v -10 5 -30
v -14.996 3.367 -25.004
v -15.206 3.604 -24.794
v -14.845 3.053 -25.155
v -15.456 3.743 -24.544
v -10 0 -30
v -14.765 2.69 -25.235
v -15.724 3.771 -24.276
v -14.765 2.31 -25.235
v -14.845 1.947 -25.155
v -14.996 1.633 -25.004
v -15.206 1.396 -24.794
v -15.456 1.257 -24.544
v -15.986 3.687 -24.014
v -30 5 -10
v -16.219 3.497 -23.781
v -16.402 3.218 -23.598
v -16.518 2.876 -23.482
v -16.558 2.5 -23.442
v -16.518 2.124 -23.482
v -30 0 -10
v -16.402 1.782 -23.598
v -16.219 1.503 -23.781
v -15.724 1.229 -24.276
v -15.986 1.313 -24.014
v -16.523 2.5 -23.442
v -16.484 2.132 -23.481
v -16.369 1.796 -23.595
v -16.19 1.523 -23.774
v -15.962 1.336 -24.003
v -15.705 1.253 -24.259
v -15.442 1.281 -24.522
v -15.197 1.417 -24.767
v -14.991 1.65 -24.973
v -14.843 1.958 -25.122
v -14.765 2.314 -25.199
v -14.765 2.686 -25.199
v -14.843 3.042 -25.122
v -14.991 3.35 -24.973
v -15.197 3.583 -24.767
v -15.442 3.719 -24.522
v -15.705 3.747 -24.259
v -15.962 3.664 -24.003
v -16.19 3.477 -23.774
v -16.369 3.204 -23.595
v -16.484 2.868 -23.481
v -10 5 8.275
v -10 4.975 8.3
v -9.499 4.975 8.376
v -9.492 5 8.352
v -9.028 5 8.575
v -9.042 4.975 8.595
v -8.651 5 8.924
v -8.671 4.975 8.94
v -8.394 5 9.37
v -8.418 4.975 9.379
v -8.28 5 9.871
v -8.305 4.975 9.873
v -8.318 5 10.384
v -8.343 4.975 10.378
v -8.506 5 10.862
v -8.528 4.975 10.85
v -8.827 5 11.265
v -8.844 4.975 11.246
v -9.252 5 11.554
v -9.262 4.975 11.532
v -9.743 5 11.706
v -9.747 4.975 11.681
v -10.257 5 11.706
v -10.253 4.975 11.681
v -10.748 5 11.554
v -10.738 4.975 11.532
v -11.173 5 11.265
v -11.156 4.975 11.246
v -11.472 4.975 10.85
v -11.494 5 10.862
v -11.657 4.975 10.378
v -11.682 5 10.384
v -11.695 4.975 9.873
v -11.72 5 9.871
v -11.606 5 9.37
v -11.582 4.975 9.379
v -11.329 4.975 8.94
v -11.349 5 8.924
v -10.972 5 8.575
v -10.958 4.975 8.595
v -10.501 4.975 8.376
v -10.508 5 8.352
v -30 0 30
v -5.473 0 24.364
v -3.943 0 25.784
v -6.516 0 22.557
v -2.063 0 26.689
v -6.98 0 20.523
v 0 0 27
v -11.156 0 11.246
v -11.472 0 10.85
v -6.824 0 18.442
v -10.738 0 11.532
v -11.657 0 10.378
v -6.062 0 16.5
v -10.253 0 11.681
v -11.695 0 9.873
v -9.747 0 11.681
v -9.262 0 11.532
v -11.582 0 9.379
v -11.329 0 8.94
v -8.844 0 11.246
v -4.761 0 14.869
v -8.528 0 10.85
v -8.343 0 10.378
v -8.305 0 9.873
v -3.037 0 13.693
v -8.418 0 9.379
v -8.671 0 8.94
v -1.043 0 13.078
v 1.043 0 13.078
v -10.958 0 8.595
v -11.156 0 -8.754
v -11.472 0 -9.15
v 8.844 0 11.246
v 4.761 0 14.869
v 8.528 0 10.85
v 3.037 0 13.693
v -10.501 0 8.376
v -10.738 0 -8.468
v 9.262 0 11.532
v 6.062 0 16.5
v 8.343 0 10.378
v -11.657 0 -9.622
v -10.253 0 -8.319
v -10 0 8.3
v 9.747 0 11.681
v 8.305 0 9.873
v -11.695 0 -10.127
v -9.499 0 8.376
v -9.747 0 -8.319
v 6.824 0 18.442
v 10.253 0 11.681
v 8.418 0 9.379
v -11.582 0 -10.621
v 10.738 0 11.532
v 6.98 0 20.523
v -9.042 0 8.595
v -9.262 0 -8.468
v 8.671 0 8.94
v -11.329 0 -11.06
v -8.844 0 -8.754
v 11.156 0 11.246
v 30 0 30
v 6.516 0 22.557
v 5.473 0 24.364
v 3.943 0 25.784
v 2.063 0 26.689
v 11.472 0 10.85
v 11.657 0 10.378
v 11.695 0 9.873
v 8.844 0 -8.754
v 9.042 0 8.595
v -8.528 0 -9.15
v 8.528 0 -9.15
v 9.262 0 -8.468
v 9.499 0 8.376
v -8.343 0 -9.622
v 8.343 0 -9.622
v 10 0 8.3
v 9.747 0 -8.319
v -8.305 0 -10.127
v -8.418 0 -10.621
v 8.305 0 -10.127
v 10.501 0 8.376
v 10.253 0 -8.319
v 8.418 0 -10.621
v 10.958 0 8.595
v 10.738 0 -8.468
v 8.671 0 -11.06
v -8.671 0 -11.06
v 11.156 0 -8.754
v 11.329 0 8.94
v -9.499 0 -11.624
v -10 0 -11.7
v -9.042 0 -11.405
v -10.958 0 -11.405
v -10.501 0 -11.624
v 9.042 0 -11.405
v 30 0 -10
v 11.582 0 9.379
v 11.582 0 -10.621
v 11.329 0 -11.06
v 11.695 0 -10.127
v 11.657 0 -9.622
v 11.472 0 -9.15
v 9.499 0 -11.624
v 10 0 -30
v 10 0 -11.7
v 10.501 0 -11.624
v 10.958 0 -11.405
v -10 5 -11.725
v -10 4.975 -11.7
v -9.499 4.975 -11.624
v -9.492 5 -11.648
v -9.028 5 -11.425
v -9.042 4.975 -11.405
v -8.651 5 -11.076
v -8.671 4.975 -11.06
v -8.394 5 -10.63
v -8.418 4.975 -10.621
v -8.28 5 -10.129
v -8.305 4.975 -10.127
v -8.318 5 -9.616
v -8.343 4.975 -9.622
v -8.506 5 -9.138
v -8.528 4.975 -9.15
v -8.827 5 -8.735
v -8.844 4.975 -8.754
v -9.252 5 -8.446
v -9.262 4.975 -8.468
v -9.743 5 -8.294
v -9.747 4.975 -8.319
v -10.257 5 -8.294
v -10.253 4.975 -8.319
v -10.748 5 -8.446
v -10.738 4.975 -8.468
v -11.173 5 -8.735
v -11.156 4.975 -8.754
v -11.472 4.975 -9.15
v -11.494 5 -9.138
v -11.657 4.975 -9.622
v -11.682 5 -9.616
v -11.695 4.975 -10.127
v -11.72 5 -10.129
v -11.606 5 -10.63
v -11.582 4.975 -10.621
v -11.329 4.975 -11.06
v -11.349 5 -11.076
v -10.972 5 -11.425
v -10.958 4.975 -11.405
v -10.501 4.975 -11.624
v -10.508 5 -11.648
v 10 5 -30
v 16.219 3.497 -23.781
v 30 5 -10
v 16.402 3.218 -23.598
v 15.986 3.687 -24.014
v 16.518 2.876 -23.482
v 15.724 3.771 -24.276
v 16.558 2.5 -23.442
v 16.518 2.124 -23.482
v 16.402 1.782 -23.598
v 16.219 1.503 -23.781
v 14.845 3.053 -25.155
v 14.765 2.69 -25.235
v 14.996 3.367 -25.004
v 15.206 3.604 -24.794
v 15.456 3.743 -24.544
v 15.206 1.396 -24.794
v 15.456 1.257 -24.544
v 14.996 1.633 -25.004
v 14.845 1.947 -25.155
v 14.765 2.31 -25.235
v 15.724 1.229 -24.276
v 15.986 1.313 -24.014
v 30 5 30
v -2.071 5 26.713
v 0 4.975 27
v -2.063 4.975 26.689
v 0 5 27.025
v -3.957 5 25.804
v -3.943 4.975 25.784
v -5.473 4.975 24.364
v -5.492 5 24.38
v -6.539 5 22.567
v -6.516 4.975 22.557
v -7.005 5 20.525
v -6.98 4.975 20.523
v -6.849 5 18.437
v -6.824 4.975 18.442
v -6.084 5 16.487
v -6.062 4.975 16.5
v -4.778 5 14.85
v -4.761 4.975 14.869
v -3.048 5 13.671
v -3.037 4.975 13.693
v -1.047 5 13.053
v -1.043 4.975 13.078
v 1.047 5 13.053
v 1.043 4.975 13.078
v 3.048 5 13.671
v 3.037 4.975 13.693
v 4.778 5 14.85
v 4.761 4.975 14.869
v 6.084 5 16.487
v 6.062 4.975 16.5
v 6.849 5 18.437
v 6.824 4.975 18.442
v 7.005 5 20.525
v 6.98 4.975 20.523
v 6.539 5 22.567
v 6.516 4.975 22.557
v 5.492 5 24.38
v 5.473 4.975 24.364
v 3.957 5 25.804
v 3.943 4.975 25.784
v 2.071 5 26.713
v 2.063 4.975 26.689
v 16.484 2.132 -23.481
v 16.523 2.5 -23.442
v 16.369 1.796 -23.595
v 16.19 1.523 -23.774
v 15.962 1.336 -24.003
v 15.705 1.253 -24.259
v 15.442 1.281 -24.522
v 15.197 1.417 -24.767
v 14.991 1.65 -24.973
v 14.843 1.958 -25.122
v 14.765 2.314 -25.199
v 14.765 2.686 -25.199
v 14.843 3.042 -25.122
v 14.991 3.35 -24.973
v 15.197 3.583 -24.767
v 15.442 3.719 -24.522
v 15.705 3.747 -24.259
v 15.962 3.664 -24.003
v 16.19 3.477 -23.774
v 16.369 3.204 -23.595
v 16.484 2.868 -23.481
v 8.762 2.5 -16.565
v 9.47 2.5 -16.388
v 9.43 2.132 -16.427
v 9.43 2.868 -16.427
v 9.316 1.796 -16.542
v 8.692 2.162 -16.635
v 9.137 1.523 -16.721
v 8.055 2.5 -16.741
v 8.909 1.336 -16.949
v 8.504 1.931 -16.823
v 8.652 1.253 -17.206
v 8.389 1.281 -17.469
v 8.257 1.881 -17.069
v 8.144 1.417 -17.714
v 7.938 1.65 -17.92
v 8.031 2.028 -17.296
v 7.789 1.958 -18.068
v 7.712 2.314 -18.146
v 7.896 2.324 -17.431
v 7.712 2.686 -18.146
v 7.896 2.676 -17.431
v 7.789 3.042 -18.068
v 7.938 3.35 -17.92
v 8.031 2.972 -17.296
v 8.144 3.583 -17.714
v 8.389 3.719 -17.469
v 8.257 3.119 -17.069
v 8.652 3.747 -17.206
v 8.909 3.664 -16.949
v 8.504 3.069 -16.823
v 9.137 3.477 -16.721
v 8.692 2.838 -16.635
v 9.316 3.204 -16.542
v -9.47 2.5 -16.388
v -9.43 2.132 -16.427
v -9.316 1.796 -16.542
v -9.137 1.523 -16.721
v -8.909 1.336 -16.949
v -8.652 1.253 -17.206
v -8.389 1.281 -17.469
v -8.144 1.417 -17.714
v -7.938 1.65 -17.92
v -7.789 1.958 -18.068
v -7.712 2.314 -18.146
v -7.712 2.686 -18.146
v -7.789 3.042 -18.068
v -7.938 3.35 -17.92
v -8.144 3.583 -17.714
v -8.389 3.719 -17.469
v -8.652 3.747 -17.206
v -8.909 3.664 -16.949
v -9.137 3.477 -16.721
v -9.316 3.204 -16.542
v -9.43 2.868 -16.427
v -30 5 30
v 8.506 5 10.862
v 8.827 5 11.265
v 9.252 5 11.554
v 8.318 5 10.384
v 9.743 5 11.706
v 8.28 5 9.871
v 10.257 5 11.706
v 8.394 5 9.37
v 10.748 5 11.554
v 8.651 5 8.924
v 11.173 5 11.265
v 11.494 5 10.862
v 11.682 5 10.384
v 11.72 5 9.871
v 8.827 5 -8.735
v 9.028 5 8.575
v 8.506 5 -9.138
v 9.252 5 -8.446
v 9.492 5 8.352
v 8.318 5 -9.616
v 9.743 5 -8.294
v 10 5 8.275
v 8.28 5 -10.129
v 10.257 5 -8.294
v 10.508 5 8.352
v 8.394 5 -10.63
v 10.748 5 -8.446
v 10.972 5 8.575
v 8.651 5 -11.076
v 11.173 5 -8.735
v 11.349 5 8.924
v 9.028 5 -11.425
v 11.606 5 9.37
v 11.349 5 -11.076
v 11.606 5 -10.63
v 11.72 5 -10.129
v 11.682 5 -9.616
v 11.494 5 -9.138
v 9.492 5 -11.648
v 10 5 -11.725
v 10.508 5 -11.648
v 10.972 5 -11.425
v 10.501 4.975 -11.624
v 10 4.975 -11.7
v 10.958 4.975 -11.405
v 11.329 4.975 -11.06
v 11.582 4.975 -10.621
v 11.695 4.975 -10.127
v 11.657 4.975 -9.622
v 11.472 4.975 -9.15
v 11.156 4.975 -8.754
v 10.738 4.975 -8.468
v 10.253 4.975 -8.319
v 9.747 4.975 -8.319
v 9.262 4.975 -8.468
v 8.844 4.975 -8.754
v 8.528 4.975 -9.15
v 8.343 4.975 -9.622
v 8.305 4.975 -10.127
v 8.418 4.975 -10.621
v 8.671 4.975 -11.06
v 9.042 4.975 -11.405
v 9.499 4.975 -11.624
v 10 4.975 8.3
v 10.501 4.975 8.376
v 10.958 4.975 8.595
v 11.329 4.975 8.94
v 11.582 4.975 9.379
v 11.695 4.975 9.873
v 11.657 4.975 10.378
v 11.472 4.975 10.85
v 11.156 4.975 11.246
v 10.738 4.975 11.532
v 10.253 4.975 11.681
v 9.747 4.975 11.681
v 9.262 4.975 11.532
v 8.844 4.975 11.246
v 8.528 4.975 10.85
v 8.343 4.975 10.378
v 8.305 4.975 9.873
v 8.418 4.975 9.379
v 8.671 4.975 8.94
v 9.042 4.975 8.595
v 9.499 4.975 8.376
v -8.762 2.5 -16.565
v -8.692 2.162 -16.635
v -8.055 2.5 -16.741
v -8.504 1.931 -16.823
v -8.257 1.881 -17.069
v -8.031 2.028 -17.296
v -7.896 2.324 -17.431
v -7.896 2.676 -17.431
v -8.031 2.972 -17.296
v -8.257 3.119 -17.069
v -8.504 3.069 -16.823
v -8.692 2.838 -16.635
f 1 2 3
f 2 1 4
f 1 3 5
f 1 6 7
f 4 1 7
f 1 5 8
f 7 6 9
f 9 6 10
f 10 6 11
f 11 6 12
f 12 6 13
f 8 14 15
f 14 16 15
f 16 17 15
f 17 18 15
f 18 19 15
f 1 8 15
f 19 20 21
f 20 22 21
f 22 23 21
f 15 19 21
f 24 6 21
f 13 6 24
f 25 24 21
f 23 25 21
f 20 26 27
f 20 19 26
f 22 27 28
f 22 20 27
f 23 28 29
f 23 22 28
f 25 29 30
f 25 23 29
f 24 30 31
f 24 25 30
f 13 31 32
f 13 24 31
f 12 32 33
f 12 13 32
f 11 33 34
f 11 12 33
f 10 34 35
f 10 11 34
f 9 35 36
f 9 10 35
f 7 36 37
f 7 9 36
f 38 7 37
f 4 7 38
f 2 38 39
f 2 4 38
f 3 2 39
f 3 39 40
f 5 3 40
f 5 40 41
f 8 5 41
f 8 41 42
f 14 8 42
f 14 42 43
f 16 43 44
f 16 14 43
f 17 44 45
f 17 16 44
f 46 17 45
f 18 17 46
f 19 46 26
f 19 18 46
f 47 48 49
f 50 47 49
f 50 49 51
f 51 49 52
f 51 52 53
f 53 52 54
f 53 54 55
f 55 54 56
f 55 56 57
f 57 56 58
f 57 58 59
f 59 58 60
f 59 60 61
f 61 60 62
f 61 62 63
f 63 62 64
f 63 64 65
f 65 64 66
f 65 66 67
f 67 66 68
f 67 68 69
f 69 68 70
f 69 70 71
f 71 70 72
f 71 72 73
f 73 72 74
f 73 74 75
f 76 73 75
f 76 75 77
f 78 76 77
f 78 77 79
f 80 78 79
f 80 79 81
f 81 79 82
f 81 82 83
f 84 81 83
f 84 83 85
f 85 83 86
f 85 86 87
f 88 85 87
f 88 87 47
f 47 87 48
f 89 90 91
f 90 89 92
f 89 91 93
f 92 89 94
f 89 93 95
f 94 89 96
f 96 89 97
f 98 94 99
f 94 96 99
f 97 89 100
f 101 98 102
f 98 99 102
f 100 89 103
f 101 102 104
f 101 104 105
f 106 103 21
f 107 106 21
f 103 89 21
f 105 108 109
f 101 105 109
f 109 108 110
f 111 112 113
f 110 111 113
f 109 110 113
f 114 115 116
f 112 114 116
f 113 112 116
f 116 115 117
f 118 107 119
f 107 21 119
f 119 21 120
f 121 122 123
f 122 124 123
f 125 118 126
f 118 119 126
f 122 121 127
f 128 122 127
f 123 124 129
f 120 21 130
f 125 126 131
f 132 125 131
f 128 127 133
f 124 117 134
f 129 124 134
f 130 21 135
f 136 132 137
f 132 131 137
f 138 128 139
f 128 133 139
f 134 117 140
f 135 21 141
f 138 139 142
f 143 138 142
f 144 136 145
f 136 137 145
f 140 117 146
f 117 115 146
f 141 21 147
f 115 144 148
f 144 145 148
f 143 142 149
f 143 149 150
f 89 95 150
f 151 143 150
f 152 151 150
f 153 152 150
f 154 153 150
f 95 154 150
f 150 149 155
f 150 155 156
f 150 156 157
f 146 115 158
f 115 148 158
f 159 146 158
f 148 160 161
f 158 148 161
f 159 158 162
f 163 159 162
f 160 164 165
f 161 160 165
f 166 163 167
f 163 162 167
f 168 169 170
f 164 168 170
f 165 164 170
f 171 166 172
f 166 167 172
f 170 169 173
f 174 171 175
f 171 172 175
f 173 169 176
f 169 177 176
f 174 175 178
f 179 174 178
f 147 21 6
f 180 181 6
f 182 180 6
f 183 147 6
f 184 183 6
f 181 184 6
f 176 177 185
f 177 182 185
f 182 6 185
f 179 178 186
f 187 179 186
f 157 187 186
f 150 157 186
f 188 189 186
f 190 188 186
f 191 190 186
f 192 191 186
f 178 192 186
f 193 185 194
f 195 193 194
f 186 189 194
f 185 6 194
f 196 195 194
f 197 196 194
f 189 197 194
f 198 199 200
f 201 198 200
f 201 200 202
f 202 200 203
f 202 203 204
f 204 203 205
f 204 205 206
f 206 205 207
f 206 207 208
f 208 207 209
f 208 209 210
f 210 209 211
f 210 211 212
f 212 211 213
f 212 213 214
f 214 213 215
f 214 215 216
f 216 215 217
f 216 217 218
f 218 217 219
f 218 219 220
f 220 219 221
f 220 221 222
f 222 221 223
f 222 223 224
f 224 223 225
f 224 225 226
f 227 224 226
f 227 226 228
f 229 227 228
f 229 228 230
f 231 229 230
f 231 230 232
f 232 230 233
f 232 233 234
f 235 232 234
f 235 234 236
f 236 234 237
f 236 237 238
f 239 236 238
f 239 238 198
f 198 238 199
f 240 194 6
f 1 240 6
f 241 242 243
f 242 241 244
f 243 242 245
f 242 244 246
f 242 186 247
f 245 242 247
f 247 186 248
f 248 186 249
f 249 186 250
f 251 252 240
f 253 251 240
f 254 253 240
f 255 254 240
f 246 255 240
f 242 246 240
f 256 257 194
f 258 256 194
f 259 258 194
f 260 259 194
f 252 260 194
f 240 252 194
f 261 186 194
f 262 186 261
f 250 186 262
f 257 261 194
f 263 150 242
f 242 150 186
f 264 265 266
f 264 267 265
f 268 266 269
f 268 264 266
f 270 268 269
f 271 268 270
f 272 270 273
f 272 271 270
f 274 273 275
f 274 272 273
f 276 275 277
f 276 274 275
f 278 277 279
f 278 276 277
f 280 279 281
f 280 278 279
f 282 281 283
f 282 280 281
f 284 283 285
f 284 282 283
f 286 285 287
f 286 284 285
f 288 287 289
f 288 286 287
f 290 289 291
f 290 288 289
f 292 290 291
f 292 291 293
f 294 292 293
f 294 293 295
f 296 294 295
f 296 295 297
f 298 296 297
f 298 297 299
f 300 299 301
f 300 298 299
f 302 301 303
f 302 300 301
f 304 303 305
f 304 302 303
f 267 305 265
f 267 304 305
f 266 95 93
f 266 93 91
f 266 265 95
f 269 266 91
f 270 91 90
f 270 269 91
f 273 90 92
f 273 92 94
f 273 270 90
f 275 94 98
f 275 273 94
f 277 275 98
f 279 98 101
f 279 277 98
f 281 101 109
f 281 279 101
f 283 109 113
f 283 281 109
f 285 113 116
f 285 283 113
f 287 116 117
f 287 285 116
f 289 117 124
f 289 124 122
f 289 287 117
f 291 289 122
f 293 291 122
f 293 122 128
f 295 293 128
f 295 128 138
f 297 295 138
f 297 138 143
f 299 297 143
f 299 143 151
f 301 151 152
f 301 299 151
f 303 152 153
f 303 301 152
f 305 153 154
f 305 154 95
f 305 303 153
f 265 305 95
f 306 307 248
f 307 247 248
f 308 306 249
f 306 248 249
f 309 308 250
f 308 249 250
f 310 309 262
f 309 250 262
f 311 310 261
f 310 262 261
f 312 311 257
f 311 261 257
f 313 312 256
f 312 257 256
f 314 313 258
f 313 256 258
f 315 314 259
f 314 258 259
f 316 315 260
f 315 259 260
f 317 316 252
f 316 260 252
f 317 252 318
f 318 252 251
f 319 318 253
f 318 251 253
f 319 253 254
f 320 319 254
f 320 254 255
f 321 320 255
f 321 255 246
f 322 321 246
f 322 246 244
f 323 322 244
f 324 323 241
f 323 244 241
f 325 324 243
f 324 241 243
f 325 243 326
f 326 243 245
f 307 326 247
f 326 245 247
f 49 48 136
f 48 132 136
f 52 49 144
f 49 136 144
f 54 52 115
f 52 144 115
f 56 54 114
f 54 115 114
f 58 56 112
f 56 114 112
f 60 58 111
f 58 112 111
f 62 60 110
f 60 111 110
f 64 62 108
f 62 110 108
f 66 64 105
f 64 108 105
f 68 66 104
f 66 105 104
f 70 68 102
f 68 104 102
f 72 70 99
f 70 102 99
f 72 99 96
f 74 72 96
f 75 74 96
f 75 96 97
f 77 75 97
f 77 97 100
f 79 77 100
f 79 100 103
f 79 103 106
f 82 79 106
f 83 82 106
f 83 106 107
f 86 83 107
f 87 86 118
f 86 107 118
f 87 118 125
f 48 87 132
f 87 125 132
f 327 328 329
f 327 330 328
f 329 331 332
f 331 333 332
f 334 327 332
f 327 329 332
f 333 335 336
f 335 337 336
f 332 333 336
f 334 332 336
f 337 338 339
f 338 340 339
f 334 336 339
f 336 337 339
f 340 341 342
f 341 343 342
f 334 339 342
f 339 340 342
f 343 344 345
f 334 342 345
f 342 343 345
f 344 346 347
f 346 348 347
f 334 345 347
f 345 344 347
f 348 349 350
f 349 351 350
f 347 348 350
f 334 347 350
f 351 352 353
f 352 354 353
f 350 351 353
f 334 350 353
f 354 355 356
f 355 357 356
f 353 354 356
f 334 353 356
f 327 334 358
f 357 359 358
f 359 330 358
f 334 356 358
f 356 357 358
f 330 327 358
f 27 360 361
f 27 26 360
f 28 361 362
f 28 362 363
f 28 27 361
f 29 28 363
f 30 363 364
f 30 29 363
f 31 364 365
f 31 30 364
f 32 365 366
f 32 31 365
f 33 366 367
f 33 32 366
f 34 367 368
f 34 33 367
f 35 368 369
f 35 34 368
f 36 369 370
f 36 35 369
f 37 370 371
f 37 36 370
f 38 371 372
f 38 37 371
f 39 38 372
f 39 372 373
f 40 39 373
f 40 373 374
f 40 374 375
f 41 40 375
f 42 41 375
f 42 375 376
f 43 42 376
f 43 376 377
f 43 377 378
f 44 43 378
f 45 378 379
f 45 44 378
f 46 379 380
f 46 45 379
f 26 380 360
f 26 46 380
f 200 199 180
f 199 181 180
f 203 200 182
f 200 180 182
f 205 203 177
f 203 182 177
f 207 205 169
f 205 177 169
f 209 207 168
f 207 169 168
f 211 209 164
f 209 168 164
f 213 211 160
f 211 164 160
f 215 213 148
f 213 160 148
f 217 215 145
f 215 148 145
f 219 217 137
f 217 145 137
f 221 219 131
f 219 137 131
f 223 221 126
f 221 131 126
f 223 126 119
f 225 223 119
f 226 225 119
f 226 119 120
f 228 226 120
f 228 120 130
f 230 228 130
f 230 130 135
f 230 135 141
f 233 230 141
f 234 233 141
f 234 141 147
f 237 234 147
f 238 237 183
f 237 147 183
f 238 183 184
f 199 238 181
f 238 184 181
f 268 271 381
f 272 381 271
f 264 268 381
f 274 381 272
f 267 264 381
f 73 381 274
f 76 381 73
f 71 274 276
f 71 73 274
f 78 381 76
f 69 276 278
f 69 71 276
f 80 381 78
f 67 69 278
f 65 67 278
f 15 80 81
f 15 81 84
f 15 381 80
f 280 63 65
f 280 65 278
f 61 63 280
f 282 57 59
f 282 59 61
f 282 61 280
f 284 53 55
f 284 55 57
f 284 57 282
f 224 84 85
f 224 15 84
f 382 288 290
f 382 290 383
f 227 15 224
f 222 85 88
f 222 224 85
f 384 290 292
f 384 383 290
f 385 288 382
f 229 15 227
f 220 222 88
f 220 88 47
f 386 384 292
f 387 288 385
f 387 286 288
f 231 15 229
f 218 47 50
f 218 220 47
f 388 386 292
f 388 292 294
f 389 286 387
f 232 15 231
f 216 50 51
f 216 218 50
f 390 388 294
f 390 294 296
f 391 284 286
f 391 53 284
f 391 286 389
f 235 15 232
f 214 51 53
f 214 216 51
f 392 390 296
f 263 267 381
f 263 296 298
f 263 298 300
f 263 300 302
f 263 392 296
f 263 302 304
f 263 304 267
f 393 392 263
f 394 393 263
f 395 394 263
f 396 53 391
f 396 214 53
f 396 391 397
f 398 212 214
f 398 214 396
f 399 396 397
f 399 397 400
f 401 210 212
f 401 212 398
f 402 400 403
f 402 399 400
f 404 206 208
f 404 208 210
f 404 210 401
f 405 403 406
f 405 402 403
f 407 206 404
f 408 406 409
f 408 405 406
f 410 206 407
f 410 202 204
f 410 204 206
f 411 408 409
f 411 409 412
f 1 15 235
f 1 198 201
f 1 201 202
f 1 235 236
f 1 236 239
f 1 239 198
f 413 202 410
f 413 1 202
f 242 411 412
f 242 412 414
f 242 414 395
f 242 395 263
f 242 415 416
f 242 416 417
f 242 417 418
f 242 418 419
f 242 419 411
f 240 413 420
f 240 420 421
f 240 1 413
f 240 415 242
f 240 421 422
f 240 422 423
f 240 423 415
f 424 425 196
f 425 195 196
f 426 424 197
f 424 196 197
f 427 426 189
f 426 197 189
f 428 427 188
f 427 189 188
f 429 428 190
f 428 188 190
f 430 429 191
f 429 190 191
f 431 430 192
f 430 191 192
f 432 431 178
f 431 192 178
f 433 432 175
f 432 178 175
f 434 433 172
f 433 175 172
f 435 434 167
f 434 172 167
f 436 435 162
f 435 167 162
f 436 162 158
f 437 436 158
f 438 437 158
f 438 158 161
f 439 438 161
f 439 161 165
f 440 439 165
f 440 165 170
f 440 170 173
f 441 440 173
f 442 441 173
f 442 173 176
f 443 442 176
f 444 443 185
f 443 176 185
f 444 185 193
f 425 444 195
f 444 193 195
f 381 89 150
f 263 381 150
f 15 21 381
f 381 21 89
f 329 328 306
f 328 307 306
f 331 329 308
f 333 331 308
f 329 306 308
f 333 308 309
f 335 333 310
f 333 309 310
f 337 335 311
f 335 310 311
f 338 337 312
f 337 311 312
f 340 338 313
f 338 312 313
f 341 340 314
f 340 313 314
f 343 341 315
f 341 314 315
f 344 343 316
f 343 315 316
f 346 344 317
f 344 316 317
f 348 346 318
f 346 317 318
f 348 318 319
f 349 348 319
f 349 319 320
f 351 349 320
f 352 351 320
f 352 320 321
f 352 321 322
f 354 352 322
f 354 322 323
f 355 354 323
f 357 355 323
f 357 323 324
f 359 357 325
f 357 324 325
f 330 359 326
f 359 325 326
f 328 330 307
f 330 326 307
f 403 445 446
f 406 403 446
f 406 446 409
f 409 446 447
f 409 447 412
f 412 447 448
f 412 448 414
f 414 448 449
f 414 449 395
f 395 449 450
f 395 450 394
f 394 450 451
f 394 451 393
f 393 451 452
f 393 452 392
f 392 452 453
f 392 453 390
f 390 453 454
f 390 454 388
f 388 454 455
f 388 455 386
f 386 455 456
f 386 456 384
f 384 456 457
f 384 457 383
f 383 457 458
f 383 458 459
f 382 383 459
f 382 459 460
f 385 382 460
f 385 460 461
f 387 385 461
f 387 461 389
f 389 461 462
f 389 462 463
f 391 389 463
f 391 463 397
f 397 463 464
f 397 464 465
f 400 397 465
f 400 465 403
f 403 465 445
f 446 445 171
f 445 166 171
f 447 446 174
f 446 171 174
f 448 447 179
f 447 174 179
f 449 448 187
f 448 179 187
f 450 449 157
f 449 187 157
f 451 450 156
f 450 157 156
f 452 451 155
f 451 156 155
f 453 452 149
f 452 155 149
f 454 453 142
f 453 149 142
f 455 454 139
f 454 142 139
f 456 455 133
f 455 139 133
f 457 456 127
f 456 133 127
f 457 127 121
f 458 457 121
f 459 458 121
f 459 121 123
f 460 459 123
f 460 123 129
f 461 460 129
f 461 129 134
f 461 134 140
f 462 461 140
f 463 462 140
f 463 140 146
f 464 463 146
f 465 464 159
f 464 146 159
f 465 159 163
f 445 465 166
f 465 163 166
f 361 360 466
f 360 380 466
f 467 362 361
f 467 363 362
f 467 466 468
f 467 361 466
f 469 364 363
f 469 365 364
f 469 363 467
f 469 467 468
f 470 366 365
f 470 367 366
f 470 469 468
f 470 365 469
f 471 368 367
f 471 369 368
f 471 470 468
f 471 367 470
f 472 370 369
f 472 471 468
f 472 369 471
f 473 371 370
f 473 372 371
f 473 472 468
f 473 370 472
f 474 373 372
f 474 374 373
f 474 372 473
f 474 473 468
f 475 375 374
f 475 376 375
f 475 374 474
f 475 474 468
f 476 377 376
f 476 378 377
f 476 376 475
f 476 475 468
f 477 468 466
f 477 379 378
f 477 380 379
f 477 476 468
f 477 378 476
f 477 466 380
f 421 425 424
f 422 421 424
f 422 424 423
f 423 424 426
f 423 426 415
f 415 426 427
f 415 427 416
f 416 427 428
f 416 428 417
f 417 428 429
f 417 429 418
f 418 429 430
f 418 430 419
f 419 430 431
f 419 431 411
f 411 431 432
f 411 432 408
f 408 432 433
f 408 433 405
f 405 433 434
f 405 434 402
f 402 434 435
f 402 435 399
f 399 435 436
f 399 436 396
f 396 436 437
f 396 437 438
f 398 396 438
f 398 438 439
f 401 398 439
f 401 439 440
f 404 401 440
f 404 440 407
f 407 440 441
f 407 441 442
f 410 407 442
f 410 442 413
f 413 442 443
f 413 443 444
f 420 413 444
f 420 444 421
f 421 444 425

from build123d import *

# Parameters (mm, degrees)
EXTRUDE_1_DEPTH                = 5
HOLE_WIZARD_M3_1_2_D           = 3.4
HOLE_WIZARD_M3_1_2_CSINK_D     = 3.45
HOLE_WIZARD_M3_1_2_CSINK_ANGLE = 90


with BuildPart() as part:
    # 草图1 → 凸台-拉伸1 (new body)
    with BuildSketch(Plane(origin=(0, 0, 0), x_dir=(1, 0, 0), z_dir=(0, 1, 0))):
        Polygon((-10, 30), (-30, 10), (-30, -30), (30, -30), (30, 10), (10, 30), align=None)
    extrude(amount=EXTRUDE_1_DEPTH)

    # 草图8 → Hole Wizard M3 _1 (revolve, cut)
    with BuildSketch(Plane(origin=(-15.656854249, 2.5, -24.343145751), x_dir=(-0.707106781186551, 0, 0.707106781186544), z_dir=(0, 1, 0))):
        Polygon((0, 0), (0, 10.751075774), (1.25, 10), (1.25, 0.025), (1.275, 0), align=None)
    hole_wizard_m3_1 = revolve(axis=Axis((-20.14698231, 2.5, -28.833273811), (0.707106781186544, 0, 0.707106781186551)), mode=Mode.SUBTRACT)

    # 草图10 → M16 螺纹孔的螺纹孔钻头1 (revolve, cut)
    with BuildSketch(Plane(origin=(0, 5, 20), x_dir=(0, 0, 1), z_dir=(1, 0, 0))):
        Polygon((0, 0), (0, 5), (7, 5), (7, 0.025), (7.025, 0), align=None)
    revolve(axis=Axis((0, 11.35, 20), (0, -1, 0)), mode=Mode.SUBTRACT)

    # 镜向2: Hole Wizard M3 _1 across plane
    add(hole_wizard_m3_1.mirror(Plane(origin=(0, 0, 0), x_dir=(0, 0, 1), z_dir=(1, 0, 0))), mode=Mode.SUBTRACT)

    # Hole Wizard M3 _1 2 (through all)
    with Locations(Plane(origin=(-10, 5, -10), x_dir=(0, 0, 1), z_dir=(0, 1, 0))):
        with Locations((0, 0), (0, 20), (20, 20), (20, 0)):
            CounterSinkHole(HOLE_WIZARD_M3_1_2_D / 2, HOLE_WIZARD_M3_1_2_CSINK_D / 2, counter_sink_angle=HOLE_WIZARD_M3_1_2_CSINK_ANGLE)


solid = part.part
